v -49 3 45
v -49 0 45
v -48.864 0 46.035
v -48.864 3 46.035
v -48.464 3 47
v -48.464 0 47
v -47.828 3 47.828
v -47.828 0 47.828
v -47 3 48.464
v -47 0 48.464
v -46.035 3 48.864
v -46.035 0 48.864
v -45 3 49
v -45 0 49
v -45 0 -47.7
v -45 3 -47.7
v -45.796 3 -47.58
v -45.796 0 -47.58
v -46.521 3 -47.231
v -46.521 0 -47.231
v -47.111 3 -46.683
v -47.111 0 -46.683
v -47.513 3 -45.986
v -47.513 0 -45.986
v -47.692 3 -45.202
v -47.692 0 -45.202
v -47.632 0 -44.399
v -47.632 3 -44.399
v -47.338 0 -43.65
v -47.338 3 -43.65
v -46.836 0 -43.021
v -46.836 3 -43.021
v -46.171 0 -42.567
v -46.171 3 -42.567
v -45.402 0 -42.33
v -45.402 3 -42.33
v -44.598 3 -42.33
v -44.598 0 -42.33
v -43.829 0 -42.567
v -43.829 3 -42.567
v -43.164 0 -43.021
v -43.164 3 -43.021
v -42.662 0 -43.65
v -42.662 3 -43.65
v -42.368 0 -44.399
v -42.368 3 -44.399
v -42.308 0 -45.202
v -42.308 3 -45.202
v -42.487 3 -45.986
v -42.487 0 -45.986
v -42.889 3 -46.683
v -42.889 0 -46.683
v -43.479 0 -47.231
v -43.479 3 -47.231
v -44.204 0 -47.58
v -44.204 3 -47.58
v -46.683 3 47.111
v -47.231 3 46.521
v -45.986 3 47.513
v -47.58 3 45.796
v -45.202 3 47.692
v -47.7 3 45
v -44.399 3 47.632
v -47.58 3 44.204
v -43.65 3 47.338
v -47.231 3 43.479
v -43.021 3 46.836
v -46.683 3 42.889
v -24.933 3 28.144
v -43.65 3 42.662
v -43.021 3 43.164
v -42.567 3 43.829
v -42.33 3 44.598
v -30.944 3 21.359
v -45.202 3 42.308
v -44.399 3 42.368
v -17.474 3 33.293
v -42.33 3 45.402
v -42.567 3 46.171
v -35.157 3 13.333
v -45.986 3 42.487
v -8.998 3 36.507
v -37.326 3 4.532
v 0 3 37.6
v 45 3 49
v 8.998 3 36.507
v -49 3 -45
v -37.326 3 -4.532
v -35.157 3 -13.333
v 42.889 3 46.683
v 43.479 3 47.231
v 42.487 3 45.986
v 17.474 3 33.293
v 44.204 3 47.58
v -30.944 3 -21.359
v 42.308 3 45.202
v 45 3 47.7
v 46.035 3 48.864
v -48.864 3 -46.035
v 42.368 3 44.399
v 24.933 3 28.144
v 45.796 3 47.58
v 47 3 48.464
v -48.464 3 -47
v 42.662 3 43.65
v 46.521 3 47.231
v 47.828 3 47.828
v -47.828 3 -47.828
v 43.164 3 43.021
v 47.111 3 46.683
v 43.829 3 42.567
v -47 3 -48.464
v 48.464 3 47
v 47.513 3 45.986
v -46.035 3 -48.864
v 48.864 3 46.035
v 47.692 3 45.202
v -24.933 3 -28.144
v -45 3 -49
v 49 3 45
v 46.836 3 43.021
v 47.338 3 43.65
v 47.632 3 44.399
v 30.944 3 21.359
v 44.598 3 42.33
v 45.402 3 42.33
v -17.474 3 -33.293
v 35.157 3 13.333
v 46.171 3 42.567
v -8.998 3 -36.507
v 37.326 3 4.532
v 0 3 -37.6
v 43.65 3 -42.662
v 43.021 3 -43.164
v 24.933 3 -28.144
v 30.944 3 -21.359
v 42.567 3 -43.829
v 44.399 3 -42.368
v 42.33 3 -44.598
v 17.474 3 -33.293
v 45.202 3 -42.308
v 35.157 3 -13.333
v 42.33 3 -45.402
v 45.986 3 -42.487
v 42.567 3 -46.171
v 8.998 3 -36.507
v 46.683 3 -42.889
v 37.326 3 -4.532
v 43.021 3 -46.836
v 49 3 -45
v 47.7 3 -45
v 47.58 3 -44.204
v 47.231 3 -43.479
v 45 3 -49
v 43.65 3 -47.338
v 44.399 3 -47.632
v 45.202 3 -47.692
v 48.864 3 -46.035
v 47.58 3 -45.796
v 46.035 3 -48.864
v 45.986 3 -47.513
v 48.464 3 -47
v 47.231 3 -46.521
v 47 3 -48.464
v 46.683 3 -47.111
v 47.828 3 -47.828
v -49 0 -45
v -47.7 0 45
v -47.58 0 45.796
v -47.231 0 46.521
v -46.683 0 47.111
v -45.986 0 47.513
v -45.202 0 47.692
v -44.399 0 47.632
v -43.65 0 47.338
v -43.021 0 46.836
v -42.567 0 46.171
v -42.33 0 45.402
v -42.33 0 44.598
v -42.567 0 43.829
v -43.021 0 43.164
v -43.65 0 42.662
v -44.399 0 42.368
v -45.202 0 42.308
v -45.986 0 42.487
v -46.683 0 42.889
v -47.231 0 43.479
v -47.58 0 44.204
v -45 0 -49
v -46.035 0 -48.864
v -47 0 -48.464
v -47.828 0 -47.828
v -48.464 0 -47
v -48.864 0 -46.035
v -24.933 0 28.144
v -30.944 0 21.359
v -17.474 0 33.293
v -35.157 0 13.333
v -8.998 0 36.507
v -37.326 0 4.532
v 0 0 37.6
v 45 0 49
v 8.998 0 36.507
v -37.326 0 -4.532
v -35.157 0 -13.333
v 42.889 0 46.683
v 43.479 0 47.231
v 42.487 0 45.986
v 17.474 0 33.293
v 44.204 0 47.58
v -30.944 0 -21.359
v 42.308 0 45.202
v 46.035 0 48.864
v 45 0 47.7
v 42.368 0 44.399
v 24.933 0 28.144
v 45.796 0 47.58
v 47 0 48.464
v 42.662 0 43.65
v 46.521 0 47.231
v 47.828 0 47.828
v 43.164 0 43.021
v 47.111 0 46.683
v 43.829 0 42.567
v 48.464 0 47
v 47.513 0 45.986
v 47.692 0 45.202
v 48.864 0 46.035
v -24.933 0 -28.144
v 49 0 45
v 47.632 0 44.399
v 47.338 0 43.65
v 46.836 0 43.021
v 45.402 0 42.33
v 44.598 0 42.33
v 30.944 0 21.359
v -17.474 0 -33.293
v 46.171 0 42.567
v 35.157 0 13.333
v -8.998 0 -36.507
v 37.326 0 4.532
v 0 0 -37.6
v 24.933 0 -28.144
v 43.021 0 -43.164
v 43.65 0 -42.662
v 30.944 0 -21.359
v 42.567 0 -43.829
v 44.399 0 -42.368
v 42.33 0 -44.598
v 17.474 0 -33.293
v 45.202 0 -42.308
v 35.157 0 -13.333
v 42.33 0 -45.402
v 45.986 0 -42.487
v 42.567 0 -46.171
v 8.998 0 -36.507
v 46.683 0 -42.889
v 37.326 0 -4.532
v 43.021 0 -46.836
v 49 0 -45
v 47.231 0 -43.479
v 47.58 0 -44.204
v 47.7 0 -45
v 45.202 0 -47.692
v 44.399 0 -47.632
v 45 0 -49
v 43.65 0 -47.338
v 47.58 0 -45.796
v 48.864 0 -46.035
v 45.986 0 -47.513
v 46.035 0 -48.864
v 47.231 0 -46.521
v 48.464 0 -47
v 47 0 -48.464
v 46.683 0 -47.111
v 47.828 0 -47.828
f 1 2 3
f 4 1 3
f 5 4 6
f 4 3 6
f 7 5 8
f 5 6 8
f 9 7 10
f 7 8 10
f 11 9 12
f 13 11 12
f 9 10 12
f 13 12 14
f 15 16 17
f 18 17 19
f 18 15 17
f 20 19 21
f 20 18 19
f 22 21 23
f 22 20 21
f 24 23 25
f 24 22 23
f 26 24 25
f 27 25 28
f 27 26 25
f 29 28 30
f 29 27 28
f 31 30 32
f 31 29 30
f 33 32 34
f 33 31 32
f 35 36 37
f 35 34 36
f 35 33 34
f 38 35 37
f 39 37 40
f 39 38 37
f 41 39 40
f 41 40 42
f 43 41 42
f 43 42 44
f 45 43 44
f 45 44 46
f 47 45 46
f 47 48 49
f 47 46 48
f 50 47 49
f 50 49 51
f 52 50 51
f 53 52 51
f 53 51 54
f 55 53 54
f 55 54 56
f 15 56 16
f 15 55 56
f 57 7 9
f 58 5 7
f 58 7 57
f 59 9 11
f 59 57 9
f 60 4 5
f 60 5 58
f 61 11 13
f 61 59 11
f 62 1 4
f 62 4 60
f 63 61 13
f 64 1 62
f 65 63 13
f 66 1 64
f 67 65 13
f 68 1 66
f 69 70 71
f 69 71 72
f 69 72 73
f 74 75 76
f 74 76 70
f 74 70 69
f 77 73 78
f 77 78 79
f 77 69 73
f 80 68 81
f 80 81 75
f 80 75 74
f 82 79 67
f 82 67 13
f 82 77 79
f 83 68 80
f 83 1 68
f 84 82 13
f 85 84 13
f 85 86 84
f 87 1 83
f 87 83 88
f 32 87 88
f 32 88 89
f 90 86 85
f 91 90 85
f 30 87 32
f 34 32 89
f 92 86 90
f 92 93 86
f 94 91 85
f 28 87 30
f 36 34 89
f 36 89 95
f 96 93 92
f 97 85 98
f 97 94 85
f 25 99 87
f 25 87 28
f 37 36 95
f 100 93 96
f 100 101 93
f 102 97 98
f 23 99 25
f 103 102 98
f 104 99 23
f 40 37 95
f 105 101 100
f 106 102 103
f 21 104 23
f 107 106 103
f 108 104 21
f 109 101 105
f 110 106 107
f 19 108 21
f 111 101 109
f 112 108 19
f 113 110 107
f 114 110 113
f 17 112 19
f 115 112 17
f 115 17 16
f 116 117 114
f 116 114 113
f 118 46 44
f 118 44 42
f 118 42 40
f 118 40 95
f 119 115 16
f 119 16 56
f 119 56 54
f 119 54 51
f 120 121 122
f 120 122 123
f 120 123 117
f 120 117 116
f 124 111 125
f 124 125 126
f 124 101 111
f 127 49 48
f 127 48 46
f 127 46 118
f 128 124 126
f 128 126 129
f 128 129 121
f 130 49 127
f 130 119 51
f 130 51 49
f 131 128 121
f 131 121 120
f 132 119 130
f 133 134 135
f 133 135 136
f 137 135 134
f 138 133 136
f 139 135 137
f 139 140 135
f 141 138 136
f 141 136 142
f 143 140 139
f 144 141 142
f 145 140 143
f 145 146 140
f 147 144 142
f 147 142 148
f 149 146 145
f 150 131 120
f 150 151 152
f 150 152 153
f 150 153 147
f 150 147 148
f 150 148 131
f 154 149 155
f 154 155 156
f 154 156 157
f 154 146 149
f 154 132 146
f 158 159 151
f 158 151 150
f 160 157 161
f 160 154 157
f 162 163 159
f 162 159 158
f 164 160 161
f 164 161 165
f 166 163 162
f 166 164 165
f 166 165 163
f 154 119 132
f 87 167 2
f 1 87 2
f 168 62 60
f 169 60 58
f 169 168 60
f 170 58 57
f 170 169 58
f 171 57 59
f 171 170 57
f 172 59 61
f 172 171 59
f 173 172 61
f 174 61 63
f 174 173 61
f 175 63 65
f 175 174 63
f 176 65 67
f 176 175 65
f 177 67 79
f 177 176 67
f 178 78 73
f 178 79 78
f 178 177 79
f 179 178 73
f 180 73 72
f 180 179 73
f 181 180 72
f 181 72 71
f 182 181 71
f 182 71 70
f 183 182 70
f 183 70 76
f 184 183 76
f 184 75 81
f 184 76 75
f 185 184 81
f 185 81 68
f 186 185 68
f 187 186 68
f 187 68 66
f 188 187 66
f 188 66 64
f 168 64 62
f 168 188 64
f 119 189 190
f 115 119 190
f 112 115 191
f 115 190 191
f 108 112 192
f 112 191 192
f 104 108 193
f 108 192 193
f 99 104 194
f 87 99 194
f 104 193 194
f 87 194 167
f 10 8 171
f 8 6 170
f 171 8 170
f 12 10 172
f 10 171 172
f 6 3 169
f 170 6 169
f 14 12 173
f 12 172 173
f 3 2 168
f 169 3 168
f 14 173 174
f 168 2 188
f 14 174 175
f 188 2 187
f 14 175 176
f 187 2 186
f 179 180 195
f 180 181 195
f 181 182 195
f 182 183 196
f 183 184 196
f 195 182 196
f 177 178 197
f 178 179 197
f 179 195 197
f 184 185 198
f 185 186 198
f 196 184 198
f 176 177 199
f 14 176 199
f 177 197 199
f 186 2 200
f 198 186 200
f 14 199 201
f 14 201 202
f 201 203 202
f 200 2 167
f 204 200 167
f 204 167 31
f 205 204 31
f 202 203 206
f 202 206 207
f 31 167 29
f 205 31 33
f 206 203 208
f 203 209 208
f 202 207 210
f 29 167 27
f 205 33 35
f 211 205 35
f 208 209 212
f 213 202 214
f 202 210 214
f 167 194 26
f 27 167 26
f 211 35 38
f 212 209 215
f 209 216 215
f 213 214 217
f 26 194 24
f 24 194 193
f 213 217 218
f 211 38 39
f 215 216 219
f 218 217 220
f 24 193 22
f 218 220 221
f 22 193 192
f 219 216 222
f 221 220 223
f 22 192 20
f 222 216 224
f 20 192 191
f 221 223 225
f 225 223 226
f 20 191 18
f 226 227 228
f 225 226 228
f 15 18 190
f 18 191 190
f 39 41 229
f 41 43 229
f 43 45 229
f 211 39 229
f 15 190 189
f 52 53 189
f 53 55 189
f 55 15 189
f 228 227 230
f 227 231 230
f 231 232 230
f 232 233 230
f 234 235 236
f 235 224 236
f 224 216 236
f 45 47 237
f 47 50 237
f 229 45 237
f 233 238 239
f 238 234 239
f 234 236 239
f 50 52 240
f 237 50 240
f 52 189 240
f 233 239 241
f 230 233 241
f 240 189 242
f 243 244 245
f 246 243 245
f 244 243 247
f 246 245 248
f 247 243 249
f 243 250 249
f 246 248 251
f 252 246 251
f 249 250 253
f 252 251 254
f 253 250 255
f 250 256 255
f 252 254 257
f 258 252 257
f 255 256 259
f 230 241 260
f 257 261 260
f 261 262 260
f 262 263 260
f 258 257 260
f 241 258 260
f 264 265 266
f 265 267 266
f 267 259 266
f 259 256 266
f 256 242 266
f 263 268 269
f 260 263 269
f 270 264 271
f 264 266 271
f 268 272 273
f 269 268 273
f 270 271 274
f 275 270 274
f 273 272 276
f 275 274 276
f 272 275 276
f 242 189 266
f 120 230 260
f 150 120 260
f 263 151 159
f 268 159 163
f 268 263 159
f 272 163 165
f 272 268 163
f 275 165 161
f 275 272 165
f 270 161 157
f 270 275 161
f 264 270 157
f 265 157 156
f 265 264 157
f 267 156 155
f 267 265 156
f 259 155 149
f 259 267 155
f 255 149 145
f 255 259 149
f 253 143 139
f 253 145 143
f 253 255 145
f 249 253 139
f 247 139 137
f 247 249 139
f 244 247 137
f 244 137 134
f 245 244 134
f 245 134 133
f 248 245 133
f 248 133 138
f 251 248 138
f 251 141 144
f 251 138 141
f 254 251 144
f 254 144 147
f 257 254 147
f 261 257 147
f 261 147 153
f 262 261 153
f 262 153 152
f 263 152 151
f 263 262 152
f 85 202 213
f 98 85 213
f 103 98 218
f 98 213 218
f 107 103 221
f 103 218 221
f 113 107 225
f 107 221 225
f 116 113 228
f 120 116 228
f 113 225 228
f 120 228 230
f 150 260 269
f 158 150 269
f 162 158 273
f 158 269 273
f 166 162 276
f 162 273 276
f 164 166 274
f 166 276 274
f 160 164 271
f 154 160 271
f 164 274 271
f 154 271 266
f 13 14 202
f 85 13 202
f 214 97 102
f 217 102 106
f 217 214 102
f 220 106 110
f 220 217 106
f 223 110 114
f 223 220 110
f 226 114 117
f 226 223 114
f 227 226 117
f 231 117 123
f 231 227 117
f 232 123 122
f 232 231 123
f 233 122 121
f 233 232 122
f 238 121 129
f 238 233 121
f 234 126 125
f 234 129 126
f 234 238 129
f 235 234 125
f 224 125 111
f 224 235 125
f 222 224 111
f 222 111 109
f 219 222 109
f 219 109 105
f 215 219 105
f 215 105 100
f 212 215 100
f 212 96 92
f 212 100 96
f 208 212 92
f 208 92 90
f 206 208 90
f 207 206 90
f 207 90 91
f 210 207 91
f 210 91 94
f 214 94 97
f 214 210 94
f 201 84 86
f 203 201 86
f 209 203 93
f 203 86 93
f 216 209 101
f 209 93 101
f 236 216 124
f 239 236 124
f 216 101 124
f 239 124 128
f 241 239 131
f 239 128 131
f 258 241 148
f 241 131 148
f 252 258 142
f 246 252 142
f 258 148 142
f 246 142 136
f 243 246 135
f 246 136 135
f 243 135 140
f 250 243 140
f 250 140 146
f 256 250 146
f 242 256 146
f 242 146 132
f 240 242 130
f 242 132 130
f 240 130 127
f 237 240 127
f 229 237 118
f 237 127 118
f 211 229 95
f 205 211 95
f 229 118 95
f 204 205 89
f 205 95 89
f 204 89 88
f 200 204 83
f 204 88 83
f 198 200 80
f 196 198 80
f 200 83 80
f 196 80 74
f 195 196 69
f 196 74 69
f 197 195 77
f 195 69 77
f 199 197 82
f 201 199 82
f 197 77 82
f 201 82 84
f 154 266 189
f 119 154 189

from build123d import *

# Parameters (mm, degrees)
EXTRUDE_1_DEPTH          = 3
SKETCH_2_R               = 37.6
CUT_EXTRUDE_1_DEPTH      = 3
SKETCH_1_4_R             = 2.7
CUT_EXTRUDE_5_DEPTH      = 10
PATTERN_CIRCULAR_2_COUNT = 4


with BuildPart() as part:
    # Эскиз1 → Бобышка-Вытянуть1 (new body)
    with BuildSketch(Plane(origin=(0, 0, 0), x_dir=(1, 0, 0), z_dir=(0, 1, 0))):
        with BuildLine():
            Line((-49, 45), (-49, -45))
            ThreePointArc((-49, -45), (-47.828427125, -47.828427125), (-45, -49))
            Line((-45, -49), (45, -49))
            ThreePointArc((45, -49), (47.828427125, -47.828427125), (49, -45))
            Line((49, -45), (49, 45))
            ThreePointArc((49, 45), (47.828427125, 47.828427125), (45, 49))
            Line((45, 49), (-45, 49))
            ThreePointArc((-45, 49), (-47.828427125, 47.828427125), (-49, 45))
        make_face()
    extrude(amount=EXTRUDE_1_DEPTH)

    # Эскиз2 → Вырез-Вытянуть1 (cut)
    with BuildSketch(Plane(origin=(0, 3, 0), x_dir=(1, 0, 0), z_dir=(0, 1, 0))):
        Circle(SKETCH_2_R)
    extrude(amount=-CUT_EXTRUDE_1_DEPTH, mode=Mode.SUBTRACT)

    # Эскиз1<4> → Вырез-Вытянуть5 (cut)
    with BuildSketch(Plane(origin=(0, 0, 0), x_dir=(1, 0, 0), z_dir=(0, 1, 0))):
        with Locations((45, -45)):
            Circle(SKETCH_1_4_R)
    cut_extrude_5 = extrude(amount=CUT_EXTRUDE_5_DEPTH, mode=Mode.SUBTRACT)

    # Круговой массив2: Вырез-Вытянуть5 ×4 about axis
    pattern_circular_2_axis = Axis((0, 0, 0), (0, 1, 0))
    for i in range(1, PATTERN_CIRCULAR_2_COUNT):
        add(cut_extrude_5.rotate(pattern_circular_2_axis, i * 360 / PATTERN_CIRCULAR_2_COUNT), mode=Mode.SUBTRACT)


solid = part.part
